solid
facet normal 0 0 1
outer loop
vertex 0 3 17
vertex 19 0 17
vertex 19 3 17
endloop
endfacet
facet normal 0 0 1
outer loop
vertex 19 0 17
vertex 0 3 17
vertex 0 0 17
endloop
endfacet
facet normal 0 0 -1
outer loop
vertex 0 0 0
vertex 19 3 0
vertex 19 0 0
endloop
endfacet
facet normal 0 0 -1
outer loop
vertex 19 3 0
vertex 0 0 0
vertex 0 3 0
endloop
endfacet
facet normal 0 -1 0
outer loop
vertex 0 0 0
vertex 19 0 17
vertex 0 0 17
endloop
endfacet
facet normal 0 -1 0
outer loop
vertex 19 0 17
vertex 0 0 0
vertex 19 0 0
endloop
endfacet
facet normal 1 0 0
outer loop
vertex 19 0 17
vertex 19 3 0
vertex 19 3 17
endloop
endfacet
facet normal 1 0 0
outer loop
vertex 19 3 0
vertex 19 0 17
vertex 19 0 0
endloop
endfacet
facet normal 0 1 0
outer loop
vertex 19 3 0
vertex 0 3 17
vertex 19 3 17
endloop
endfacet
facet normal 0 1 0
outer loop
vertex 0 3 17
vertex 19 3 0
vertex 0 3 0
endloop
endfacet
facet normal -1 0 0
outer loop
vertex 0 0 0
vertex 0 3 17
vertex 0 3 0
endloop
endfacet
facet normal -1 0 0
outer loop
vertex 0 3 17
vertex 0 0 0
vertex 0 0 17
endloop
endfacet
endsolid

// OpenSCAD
// Generated by SolidPython 1.0.1 on 2020-07-29 00:46:56


cube(size = [19, 3, 17]);
/***********************************************
*********      SolidPython code:      **********
************************************************
 
# import packages: SolidPython
from solid import *
from solid.utils import *
from itertools import chain, combinations, permutations


class Resize:

    def __init__(self, scad_file):
        self.scad_file = scad_file
        #self.scad_file = import_scad(scad_file)
        # cone/cylinder param:
        self.r1 = 0
        self.r2 = 0
        self.h = 0
        # rectangular prism param:
        self.w = 0
        self.l = 0
        # ellipse param:
        self.r = 0

    # import OpenScad code (file name corresponds to shape)


    # classify shape + parameters
    def assign(self, param1, param2, param3):
        if self.scad_file == 'cone.scad':
            self.r1 = param1
            self.r2 = param2
            self.h = param3
        elif self.scad_file == 'cylinder.scad':
            self.r1 = param1
            self.r2 = param2
            self.h = param3
        elif self.scad_file == 'rectangularPrism.scad':
            self.h = param1
            self.l = param2
            self.w = param3
        else:
            self.r = param1
            self.h = param2

    # resize parameters
    def iterate(self):
        x = range(3, 20, 2)
        i = 1
        if self.scad_file == 'cone.scad':
            tempList = list(permutations(x, 2))
            for temp in tempList:
                param1 = temp[0]
                param2 = temp[1]
                filepath = 'produced_scad_files/' + 'cone' + str(param1) + '_' + str(param2) + '_' + '.scad'
                scad_render_to_file(cylinder(h=param1, r1=param2, r2=0), filepath)

        elif self.scad_file == 'cylinder.scad':
            tempList = list(permutations(x, 3))
            for temp in tempList:
                param1 = temp[0]
                param2 = temp[1]
                filepath = 'produced_scad_files/' + 'cylinder' + str(param1) + '_' + str(param2) + '_' + '.scad'
                scad_render_to_file(cylinder(h=param1, r1=param2, r2=param2), filepath)

        elif self.scad_file == 'rectangularPrism.scad':
            tempList = list(permutations(x, 3))
            for temp in tempList:
                param1 = temp[0]
                param2 = temp[1]
                param3 = temp[2]
                filepath = 'produced_scad_files/' + 'rectangularPrism' + str(param1) + '_' + str(param2) + '_' + str(
                    param3) + '.scad'
                scad_render_to_file(cube(size=(param1, param2, param3)), filepath)

        elif self.scad_file == 'ellipse.scad':
            tempList = list(permutations(x, 4))
            for temp in tempList:
                param1 = temp[0]
                param2 = temp[1]
                param3 = temp[2]
                param4 = temp[3]
                filepath = 'produced_scad_files/' + 'ellipse' + str(param1) + '_' + str(param2) + '_' + str(param3) + '_' + str(param4) + '.scad'
                scad_render_to_file(scale([param1, param2, param3])(sphere(r=param4)), filepath)

    def render_to_scadfile(self):
        scad_render_to_file(scad, 'example.scad') 
 
************************************************/
